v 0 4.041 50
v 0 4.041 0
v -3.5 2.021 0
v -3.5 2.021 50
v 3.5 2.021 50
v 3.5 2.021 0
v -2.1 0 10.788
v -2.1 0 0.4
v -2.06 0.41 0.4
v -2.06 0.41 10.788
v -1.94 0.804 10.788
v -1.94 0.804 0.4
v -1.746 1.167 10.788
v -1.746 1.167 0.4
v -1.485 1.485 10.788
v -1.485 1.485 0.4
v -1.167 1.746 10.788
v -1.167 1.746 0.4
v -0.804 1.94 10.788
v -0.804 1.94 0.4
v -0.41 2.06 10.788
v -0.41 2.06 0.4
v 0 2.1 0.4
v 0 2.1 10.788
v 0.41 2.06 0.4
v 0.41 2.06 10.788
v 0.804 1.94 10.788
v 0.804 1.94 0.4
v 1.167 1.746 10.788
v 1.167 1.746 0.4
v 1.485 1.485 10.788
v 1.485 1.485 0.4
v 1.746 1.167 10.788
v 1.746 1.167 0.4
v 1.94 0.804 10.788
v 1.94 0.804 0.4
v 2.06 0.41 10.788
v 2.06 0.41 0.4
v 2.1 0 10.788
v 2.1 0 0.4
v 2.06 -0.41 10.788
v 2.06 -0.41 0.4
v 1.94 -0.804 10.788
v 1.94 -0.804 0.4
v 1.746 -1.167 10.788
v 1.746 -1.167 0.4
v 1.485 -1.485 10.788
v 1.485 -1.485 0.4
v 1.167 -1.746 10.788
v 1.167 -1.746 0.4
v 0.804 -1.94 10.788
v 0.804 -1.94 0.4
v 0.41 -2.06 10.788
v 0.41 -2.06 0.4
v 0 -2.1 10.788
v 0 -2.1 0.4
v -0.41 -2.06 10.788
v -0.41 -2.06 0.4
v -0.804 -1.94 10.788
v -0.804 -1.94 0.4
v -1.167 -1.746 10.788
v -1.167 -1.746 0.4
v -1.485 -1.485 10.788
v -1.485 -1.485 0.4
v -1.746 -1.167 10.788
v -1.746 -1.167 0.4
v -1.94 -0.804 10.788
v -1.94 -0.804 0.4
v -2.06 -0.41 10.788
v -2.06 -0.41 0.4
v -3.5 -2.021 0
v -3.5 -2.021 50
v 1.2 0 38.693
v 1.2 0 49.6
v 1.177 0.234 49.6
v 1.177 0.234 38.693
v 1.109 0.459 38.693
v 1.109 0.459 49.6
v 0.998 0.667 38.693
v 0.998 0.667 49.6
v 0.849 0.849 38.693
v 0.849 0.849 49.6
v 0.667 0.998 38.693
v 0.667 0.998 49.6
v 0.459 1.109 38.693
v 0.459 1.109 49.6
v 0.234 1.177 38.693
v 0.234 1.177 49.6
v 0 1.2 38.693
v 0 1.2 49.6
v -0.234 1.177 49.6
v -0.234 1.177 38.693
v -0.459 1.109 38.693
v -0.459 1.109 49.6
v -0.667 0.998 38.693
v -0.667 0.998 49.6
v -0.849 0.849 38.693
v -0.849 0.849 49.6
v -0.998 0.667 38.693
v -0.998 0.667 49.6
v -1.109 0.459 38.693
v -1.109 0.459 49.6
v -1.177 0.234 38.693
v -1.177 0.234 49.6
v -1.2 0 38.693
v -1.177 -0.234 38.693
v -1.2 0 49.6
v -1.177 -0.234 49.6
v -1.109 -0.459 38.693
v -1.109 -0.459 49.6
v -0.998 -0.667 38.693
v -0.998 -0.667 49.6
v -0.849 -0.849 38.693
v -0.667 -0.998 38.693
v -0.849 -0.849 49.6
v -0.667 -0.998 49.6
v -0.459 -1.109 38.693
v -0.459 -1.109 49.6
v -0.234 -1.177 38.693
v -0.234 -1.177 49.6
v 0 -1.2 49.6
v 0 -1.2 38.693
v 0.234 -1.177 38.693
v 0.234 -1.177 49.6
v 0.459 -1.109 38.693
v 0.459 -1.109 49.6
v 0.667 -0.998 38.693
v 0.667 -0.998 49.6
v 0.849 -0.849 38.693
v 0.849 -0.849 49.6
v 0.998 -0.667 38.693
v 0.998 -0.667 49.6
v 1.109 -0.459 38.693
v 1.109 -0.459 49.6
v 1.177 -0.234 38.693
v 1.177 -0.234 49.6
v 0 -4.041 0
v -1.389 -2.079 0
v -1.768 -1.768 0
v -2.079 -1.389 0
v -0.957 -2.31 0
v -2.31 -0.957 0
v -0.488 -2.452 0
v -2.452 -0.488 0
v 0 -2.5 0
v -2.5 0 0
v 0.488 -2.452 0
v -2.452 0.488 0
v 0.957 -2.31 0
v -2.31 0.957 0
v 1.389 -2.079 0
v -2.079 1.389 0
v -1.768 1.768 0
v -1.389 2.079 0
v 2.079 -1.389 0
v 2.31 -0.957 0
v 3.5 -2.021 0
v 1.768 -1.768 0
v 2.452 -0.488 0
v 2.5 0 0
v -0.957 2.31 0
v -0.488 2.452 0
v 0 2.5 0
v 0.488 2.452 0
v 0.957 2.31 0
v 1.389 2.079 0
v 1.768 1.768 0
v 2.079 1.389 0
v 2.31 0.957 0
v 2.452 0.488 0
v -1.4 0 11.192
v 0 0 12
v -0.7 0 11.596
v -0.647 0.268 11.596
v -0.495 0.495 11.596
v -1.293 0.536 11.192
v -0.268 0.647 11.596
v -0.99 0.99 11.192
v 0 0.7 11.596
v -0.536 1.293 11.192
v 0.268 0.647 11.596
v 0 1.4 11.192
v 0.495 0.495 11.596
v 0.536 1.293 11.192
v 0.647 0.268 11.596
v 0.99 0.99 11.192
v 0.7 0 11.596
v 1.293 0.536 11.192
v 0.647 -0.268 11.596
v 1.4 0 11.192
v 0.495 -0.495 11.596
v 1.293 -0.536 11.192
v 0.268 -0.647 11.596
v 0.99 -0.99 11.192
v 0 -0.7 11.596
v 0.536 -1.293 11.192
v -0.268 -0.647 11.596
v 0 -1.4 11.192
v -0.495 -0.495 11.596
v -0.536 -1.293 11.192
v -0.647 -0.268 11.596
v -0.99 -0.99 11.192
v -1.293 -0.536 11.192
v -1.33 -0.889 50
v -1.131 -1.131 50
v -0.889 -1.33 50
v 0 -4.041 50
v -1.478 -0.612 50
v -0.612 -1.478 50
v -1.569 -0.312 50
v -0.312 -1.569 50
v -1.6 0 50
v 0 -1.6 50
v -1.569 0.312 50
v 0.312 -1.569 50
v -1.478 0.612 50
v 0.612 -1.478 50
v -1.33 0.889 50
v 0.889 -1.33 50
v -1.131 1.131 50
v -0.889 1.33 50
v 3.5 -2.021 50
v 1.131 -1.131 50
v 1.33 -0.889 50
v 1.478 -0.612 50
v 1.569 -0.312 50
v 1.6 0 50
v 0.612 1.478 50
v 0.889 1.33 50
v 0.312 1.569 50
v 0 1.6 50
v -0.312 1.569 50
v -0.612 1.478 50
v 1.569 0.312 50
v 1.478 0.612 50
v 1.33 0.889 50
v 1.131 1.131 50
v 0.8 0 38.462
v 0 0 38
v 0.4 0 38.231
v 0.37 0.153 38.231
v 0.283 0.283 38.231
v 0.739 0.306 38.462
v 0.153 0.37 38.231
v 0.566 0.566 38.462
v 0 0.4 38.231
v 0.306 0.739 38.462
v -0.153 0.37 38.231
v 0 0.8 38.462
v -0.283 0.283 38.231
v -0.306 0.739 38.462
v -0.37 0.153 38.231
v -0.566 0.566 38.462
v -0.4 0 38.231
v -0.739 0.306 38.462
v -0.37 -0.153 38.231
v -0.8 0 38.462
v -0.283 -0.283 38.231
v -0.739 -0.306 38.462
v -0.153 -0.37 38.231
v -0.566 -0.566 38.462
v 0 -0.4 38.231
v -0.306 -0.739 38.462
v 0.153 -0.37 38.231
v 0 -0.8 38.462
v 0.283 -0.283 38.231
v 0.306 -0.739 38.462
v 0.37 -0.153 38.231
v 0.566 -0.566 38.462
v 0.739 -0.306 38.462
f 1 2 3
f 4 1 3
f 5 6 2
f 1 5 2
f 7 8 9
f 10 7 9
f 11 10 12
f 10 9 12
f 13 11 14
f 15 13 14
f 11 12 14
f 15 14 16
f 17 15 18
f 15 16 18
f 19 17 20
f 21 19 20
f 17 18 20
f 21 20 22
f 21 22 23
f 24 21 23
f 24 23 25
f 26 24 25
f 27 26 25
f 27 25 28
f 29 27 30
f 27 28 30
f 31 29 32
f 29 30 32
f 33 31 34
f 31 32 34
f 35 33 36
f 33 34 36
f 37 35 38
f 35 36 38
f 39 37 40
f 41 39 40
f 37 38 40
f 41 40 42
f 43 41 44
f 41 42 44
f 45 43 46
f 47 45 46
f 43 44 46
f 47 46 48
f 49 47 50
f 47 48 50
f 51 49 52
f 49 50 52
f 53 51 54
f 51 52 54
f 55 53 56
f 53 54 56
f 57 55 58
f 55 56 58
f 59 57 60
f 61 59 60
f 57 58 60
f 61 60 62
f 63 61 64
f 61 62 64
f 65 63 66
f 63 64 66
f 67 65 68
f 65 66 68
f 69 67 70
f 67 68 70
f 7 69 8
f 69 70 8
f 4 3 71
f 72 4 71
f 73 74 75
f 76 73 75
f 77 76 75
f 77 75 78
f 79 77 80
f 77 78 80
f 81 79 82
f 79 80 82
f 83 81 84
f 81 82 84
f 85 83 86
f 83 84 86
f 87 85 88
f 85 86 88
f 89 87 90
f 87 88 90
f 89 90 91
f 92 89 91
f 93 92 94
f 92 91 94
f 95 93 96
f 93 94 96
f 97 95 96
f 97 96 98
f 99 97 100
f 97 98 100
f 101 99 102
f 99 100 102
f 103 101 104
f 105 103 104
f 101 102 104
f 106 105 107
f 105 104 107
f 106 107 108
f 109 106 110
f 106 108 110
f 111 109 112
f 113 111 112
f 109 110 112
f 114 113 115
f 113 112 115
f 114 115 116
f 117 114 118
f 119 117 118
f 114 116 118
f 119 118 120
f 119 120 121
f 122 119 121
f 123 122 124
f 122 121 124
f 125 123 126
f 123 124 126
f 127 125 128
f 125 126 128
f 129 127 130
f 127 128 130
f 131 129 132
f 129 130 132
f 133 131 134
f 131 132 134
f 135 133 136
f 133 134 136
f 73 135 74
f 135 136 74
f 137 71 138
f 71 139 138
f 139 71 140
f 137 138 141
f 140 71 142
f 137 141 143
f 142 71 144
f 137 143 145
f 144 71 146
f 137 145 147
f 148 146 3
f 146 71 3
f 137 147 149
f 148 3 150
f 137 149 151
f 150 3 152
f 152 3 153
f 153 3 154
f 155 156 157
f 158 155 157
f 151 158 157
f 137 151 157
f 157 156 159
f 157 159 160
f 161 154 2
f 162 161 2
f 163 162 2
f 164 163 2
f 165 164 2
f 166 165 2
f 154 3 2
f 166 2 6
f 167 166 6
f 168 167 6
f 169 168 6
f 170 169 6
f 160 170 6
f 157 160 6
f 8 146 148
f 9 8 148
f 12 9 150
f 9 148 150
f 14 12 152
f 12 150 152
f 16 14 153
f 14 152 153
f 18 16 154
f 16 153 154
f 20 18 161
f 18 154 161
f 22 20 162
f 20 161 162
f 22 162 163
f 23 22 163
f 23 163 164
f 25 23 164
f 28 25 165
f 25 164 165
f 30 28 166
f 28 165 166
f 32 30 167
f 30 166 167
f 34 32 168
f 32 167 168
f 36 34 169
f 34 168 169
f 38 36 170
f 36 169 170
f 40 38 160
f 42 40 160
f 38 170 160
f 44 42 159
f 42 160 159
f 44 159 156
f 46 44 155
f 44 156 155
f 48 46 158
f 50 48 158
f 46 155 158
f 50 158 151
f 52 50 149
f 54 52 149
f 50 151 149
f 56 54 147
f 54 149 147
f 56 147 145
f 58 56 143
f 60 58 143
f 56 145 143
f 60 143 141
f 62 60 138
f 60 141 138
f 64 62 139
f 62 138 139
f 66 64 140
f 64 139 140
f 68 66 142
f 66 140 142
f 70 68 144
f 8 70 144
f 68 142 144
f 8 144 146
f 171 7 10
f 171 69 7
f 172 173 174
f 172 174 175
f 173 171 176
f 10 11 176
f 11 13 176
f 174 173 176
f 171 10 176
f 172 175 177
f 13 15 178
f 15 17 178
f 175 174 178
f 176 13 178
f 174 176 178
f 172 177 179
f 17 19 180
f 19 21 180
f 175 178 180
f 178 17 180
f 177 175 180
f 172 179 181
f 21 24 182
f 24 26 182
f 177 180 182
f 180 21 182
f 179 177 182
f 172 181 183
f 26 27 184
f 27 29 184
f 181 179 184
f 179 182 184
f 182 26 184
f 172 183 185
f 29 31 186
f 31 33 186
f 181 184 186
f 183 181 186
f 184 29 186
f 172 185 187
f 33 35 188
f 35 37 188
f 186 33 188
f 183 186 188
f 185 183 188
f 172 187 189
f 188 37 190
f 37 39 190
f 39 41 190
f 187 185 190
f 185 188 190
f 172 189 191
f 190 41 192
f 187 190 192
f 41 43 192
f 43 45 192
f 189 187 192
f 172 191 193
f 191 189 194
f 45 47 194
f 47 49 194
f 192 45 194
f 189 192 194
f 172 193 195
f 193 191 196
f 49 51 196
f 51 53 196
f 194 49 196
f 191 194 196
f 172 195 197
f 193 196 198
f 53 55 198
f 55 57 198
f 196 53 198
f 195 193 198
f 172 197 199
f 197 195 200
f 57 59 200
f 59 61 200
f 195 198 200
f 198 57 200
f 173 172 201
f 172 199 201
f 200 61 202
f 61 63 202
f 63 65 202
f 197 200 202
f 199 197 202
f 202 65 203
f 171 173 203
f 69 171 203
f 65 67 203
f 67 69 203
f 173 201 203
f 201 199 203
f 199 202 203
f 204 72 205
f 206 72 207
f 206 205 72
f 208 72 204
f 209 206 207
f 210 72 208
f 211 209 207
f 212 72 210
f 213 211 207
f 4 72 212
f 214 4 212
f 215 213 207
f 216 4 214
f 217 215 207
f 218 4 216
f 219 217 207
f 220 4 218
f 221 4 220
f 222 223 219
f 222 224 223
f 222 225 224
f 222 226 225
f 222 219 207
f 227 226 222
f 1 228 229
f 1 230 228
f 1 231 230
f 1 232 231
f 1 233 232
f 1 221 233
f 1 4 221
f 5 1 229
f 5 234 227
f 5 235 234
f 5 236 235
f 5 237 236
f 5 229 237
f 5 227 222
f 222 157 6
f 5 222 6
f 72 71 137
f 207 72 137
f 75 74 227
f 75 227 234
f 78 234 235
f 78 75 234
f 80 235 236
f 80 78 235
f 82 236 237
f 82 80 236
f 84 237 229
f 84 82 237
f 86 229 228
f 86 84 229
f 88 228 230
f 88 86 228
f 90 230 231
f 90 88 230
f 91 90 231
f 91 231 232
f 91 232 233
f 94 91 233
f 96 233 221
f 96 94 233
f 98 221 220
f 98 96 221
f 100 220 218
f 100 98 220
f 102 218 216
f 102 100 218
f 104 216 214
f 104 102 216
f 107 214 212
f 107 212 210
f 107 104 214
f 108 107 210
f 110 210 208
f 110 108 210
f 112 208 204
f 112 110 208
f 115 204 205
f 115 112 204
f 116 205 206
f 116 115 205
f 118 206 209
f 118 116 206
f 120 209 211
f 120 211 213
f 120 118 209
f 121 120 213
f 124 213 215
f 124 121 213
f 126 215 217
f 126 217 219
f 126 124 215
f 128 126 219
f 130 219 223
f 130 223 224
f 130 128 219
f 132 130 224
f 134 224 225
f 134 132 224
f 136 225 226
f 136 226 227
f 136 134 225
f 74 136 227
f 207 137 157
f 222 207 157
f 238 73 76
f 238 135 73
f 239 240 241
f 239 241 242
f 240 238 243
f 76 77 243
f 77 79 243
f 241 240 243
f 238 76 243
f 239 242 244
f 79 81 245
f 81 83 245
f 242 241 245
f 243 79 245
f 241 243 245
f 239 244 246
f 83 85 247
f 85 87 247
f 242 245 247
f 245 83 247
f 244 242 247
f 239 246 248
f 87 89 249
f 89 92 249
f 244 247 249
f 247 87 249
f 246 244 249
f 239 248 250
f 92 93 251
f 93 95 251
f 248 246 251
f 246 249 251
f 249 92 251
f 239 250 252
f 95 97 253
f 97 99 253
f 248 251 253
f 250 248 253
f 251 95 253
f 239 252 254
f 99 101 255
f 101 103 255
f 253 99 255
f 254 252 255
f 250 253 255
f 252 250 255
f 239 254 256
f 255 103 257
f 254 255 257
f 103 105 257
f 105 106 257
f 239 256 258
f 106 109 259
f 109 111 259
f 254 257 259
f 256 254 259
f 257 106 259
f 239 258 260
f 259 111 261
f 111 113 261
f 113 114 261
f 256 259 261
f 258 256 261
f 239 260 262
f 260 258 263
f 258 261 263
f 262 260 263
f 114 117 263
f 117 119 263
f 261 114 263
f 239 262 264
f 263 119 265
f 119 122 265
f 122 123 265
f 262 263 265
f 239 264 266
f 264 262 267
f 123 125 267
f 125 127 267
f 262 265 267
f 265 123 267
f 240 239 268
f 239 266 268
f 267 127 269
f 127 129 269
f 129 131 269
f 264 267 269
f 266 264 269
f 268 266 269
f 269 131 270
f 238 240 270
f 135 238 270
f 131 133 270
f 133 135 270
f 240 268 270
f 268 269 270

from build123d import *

# Parameters (mm, degrees)
EXTRUDE_1_DEPTH     = 50
SKETCH_2_R          = 1.2
CUT_EXTRUDE_1_DEPTH = 12
CHAMFER_1_SIZE      = 1.2
CHAMFER_1_SIZE2     = 0.692820323
SKETCH_3_R          = 2.1
CUT_EXTRUDE_2_DEPTH = 12
CHAMFER_2_SIZE      = 2.1
CHAMFER_2_SIZE2     = 1.212435565
CHAMFER_3_SIZE      = 0.4


with BuildPart() as part:
    # Эскиз1 → Вытянуть1 (new body)
    with BuildSketch(Plane.XY):
        Polygon((0, 4.041451884), (-3.5, 2.020725942), (-3.5, -2.020725942), (0, -4.041451884), (3.5, -2.020725942), (3.5, 2.020725942), align=None)
    extrude(amount=EXTRUDE_1_DEPTH)

    # Эскиз2 → Вырез-Вытянуть1 (cut)
    with BuildSketch(Plane.XY.offset(50)):
        Circle(SKETCH_2_R)
    extrude(amount=-CUT_EXTRUDE_1_DEPTH, mode=Mode.SUBTRACT)

    # Фаска1
    chamfer_1_edges = [part.edges().sort_by_distance(p)[0] for p in [
        (-1.2, 0, 38),
    ]]
    chamfer_1_side = [part.faces().sort_by_distance(p)[0] for p in [
        (0, 0, 38),
    ]]
    chamfer(chamfer_1_edges, length=CHAMFER_1_SIZE, length2=CHAMFER_1_SIZE2, reference=chamfer_1_side[0])

    # Эскиз3 → Вырез-Вытянуть2 (cut)
    with BuildSketch(Plane(origin=(0, 0, 0), x_dir=(-1, 0, 0), z_dir=(0, 0, -1))):
        Circle(SKETCH_3_R)
    extrude(amount=-CUT_EXTRUDE_2_DEPTH, mode=Mode.SUBTRACT)

    # Фаска2
    chamfer_2_edges = [part.edges().sort_by_distance(p)[0] for p in [
        (2.1, 0, 12),
    ]]
    chamfer_2_side = [part.faces().sort_by_distance(p)[0] for p in [
        (0, 0, 12),
    ]]
    chamfer(chamfer_2_edges, length=CHAMFER_2_SIZE, length2=CHAMFER_2_SIZE2, reference=chamfer_2_side[0])

    # Фаска3
    chamfer_3_edges = [part.edges().sort_by_distance(p)[0] for p in [
        (-1.2, 0, 50),
        (2.1, 0, 0),
    ]]
    chamfer(chamfer_3_edges, length=CHAMFER_3_SIZE)


solid = part.part
